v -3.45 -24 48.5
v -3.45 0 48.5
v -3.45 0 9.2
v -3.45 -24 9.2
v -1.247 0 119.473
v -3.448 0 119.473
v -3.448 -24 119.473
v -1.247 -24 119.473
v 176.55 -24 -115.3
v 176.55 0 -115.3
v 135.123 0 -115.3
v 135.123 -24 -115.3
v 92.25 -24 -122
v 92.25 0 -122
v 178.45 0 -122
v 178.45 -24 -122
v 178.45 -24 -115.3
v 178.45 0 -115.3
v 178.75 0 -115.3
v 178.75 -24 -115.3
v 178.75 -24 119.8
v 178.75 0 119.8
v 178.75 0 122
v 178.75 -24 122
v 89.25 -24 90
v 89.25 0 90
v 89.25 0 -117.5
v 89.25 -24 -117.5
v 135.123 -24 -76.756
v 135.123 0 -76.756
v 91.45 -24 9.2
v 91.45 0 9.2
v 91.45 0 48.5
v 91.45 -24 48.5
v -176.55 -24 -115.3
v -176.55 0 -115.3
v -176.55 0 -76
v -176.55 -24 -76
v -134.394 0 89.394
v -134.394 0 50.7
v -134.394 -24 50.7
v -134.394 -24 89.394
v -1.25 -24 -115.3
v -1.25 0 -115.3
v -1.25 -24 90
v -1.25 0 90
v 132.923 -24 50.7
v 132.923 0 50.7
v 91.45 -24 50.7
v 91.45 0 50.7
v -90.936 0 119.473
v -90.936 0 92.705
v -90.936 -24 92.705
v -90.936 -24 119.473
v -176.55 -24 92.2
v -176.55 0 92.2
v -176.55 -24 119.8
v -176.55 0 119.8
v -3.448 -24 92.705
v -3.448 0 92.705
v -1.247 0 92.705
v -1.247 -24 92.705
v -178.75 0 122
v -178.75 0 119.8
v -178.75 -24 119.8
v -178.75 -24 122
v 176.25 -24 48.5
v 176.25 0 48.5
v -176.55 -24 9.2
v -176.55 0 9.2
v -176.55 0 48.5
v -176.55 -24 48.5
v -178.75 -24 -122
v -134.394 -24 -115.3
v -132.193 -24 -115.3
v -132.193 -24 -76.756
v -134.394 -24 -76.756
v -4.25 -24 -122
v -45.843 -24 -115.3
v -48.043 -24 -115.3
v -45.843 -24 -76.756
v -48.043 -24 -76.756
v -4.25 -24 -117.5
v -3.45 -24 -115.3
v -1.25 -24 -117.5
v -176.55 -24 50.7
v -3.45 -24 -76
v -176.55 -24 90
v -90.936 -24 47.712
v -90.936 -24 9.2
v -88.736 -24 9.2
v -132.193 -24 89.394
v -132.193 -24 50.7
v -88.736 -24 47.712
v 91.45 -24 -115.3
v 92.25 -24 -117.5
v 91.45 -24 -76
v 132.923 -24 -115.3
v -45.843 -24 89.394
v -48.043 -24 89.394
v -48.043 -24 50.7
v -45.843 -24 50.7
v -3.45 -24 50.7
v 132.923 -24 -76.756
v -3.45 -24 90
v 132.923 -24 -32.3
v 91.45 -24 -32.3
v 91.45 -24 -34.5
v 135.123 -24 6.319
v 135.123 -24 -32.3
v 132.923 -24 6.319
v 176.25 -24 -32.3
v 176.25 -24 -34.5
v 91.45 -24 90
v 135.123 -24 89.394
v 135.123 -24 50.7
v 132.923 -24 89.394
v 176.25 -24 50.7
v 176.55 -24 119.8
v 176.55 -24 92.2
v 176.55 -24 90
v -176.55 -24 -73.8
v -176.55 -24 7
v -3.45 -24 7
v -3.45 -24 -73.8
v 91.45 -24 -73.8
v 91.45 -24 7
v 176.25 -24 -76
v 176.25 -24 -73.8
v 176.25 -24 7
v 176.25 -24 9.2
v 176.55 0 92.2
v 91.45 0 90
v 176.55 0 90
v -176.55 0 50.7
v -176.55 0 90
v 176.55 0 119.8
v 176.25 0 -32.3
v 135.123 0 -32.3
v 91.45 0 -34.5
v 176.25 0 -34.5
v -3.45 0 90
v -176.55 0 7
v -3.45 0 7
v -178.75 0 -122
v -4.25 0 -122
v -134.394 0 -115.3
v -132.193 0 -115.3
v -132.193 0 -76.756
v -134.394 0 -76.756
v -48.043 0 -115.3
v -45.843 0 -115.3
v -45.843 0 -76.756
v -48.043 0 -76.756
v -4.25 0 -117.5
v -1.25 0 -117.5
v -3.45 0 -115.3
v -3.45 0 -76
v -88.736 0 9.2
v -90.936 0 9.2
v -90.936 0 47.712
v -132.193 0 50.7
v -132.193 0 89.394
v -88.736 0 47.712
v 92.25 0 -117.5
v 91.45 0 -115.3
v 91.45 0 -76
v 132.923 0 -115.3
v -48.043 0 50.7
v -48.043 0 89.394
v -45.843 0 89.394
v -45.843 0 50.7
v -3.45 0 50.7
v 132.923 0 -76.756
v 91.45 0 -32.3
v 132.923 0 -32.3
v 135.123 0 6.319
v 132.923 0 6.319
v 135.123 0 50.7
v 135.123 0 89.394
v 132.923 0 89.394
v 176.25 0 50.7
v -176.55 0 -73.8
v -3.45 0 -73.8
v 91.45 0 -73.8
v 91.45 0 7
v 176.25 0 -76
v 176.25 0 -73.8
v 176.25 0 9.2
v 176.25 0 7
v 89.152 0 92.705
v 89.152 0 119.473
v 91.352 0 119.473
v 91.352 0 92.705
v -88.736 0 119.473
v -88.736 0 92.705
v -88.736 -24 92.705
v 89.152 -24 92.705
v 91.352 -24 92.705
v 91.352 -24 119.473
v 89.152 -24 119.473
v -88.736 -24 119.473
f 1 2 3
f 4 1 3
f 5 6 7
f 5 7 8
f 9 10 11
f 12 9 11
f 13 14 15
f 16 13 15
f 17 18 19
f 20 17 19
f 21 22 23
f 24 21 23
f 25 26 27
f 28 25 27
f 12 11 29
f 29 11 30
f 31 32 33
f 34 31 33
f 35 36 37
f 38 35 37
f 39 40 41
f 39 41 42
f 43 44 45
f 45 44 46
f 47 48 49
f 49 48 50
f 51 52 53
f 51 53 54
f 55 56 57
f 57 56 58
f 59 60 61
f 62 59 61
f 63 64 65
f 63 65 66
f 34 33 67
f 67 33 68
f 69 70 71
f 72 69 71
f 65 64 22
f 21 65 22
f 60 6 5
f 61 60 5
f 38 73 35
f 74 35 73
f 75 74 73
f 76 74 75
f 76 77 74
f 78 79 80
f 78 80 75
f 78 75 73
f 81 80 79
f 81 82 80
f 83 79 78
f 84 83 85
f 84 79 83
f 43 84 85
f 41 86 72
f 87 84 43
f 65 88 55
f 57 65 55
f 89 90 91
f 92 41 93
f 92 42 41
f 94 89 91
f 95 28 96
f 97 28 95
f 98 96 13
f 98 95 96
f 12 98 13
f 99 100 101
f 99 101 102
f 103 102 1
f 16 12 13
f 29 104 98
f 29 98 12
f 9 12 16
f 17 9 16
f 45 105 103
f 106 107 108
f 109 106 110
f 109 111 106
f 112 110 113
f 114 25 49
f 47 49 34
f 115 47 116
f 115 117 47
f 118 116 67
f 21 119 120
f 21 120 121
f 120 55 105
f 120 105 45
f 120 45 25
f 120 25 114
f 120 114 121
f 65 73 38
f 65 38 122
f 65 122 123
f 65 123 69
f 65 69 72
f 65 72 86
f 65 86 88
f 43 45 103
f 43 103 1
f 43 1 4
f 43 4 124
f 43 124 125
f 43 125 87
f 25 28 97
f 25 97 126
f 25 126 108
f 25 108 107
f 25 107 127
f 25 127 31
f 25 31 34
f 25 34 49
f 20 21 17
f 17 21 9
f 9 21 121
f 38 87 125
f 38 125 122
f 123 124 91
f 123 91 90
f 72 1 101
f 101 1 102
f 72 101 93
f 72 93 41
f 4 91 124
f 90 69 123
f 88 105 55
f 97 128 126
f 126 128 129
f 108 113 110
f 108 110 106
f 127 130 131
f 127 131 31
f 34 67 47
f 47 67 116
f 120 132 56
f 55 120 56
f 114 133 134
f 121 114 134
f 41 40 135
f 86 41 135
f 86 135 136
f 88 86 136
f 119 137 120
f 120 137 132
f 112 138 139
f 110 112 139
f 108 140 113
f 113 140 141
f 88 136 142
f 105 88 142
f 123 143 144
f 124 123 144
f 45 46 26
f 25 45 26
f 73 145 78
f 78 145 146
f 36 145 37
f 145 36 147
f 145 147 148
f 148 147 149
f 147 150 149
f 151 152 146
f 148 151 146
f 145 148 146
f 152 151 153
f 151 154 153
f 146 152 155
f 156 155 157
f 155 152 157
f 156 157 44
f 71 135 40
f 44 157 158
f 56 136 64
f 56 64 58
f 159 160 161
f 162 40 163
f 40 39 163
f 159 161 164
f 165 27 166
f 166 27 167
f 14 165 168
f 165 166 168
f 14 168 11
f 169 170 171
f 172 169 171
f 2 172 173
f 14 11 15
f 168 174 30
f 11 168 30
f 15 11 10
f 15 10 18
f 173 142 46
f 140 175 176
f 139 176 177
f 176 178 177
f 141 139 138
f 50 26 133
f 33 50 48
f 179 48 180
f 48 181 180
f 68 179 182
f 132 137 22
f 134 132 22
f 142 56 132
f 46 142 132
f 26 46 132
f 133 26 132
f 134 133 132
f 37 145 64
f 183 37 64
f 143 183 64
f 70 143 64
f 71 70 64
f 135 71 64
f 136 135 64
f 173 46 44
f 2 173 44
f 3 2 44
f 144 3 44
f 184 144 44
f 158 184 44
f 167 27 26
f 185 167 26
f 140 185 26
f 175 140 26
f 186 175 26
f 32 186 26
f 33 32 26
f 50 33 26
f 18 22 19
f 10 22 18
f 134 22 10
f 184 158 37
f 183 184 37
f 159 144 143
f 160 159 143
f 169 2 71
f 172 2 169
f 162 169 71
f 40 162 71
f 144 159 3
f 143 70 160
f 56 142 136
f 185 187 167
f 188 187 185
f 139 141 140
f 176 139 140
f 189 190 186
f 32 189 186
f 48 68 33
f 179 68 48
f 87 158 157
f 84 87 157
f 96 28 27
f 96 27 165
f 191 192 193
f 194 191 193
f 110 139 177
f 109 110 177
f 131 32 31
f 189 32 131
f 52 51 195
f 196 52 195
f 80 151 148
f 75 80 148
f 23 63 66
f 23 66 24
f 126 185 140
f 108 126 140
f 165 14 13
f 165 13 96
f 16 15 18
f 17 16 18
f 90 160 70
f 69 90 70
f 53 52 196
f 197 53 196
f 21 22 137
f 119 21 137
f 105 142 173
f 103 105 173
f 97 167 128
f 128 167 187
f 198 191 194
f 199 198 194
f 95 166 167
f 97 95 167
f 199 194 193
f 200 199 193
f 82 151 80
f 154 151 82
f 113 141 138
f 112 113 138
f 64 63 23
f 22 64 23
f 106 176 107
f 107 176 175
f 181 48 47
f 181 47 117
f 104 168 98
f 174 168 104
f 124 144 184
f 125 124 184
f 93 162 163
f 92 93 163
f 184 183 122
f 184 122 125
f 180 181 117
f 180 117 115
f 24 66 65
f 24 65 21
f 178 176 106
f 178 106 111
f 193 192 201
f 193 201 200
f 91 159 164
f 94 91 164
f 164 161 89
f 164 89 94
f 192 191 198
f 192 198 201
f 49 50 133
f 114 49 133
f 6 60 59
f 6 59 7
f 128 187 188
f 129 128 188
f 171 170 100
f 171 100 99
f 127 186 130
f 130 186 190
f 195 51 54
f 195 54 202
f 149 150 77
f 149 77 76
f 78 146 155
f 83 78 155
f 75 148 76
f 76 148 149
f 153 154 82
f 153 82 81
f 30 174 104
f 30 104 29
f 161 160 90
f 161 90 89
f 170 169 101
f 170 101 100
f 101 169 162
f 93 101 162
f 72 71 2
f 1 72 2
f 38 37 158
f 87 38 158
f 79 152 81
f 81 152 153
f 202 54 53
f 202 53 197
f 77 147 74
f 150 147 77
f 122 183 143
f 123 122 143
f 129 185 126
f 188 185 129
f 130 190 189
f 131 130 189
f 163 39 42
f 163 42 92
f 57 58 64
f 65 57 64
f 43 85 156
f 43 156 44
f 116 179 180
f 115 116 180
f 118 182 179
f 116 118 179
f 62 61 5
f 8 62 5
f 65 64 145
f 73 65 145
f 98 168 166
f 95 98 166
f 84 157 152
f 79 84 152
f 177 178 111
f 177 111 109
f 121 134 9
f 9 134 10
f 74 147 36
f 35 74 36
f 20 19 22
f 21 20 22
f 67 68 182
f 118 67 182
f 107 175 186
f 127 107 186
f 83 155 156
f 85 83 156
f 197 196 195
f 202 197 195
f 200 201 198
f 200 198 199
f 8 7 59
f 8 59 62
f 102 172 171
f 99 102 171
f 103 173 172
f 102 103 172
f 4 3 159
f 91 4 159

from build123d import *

# Parameters (mm, degrees)
F0_W     = 357.49997
F0_H     = 2.200038
F1_DEPTH = 24
F0_W_2   = 0.000344
F0_W_3   = 2.200038
F0_H_2   = 0.156408
F0_H_3   = 38.543728
F0_H_4   = 38.69359
F0_H_5   = 0.006374
F0_W_4   = 86.200079
F0_H_6   = 0.000344
F0_W_5   = 84.799647
F0_H_7   = 4.499984
F0_W_6   = 174.499943
F0_W_7   = 173.100028
F0_H_8   = 38.618832
F0_H_9   = 0.081304
F0_H_10  = 38.512034
F0_H_11  = 0.18793
F0_H_12  = 26.76822


with BuildPart() as f1:
    # F0 (on Front) → F1 (new body)
    with BuildSketch(Plane.XZ):
        with Locations((0, 120.900114)):
            Rectangle(F0_W, F0_H)
    extrude(amount=F1_DEPTH)


with BuildPart() as f1b:
    # F0 (on Front) → F1, piece 2 (new body)
    with BuildSketch(Plane.XZ):
        Polygon((91.450232, 89.999847), (176.549947, 89.999847), (176.549947, 92.199885), (-176.549947, 92.199885), (-176.549947, 89.999847), (-3.449919, 89.999847), (-1.249881, 89.999847), (89.250194, 89.999847), align=None)
        Polygon((176.549947, 92.199885), (176.549947, 89.999847), (176.549947, -115.300111), (178.450262, -115.300111), (178.749985, -115.300111), (178.749985, 119.79975), (176.549947, 119.79975), align=None)
        Polygon((91.450232, 50.69992), (91.450232, 89.999847), (89.250194, 89.999847), (89.250194, -115.300111), (91.450232, -115.300111), (91.450232, -76.000185), (91.449888, -76.000185), (91.449888, -73.800147), (91.450232, -73.800147), (91.450232, -34.50022), (91.449888, -34.50022), (91.449888, -32.300182), (91.450232, -32.300182), (91.450232, 6.999917), (91.449888, 6.999917), (91.449888, 9.199955), (91.450232, 9.199955), (91.450232, 48.499882), (91.449888, 48.499882), (91.449888, 50.69992), align=None)
        Polygon((178.450262, -115.300111), (176.549947, -115.300111), (135.122674, -115.300111), (135.122674, -115.456519), (132.922636, -115.456519), (132.922636, -115.300111), (91.450232, -115.300111), (89.250194, -115.300111), (89.250194, -117.500149), (92.250183, -117.500149), (92.250183, -117.499805), (178.450262, -117.499805), align=None)
        with Locations((91.45006, 49.599901)):
            Rectangle(F0_W_2, F0_H)
        Polygon((132.922636, 50.69992), (91.450232, 50.69992), (91.450232, 48.499882), (176.249879, 48.499882), (176.249879, 50.69992), (135.122674, 50.69992), (135.122674, 50.693546), (132.922636, 50.693546), align=None)
        Polygon((-176.549947, 89.999847), (-176.549947, 92.199885), (-176.549947, 119.79975), (-178.749985, 119.79975), (-178.749985, -115.300111), (-176.549947, -115.300111), (-176.549947, -76.000185), (-176.549947, -73.800147), (-176.549947, 6.999917), (-176.549947, 9.199955), (-176.549947, 48.499882), (-176.549947, 50.69992), align=None)
        with Locations((134.022655, -115.378315)):
            Rectangle(F0_W_3, F0_H_2)
        with Locations((134.022655, -96.028247)):
            Rectangle(F0_W_3, F0_H_3)
        Polygon((-1.249881, -115.300111), (-1.249881, 89.999847), (-3.449919, 89.999847), (-3.449919, 50.69992), (-3.449919, 48.499882), (-3.449919, 9.199955), (-3.449919, 6.999917), (-3.449919, -73.800147), (-3.449919, -76.000185), (-3.449919, -115.300111), (-1.250053, -115.300111), align=None)
        with Locations((134.022655, 70.046715)):
            Rectangle(F0_W_3, F0_H_4)
        with Locations((134.022655, 50.696733)):
            Rectangle(F0_W_3, F0_H_5)
        with Locations((135.3502225, -117.499977)):
            Rectangle(F0_W_4, F0_H_6)
        with Locations((91.45006, 8.099936)):
            Rectangle(F0_W_2, F0_H)
        with Locations((133.8500555, 8.099936)):
            Rectangle(F0_W_5, F0_H)
        Polygon((-134.393519, 50.69992), (-176.549947, 50.69992), (-176.549947, 48.499882), (-3.449919, 48.499882), (-3.449919, 50.69992), (-45.843369, 50.69992), (-45.843369, 50.693546), (-48.043407, 50.693546), (-48.043407, 50.69992), (-132.193481, 50.69992), (-132.193481, 50.693546), (-134.393519, 50.693546), align=None)
        with Locations((135.3502225, -119.750141)):
            Rectangle(F0_W_4, F0_H_7)
        Polygon((-1.250053, -117.500149), (-1.250053, -115.300111), (-3.449919, -115.300111), (-45.843369, -115.300111), (-45.843369, -115.456519), (-48.043407, -115.456519), (-48.043407, -115.300111), (-132.193481, -115.300111), (-132.193481, -115.456519), (-134.393519, -115.456519), (-134.393519, -115.300111), (-176.549947, -115.300111), (-178.749985, -115.300111), (-178.749985, -117.499805), (-4.250042, -117.499805), (-4.250042, -117.500149), align=None)
        with Locations((133.8500555, -74.900166)):
            Rectangle(F0_W_5, F0_H)
        with Locations((91.45006, -74.900166)):
            Rectangle(F0_W_2, F0_H)
        with Locations((-133.2935, 70.046715)):
            Rectangle(F0_W_3, F0_H_4)
        with Locations((-133.2935, 50.696733)):
            Rectangle(F0_W_3, F0_H_5)
        with Locations((-46.943388, 50.696733)):
            Rectangle(F0_W_3, F0_H_5)
        with Locations((-46.943388, 70.046715)):
            Rectangle(F0_W_3, F0_H_4)
        with Locations((91.45006, -33.400201)):
            Rectangle(F0_W_2, F0_H)
        Polygon((132.922636, -32.300182), (91.450232, -32.300182), (91.450232, -34.50022), (176.249879, -34.50022), (176.249879, -32.300182), (135.122674, -32.300182), (135.122674, -32.381486), (132.922636, -32.381486), align=None)
        Polygon((-90.936396, 9.199955), (-176.549947, 9.199955), (-176.549947, 6.999917), (-3.449919, 6.999917), (-3.449919, 9.199955), (-88.736358, 9.199955), (-88.736358, 9.012025), (-90.936396, 9.012025), align=None)
        with Locations((-91.5000135, -117.499977)):
            Rectangle(F0_W_6, F0_H_6)
        with Locations((-46.943388, -115.378315)):
            Rectangle(F0_W_3, F0_H_2)
        with Locations((-46.943388, -96.028247)):
            Rectangle(F0_W_3, F0_H_3)
        with Locations((-89.999933, -74.900166)):
            Rectangle(F0_W_7, F0_H)
        with Locations((-91.5000135, -119.750141)):
            Rectangle(F0_W_6, F0_H_7)
        with Locations((134.022655, -12.990766)):
            Rectangle(F0_W_3, F0_H_8)
        with Locations((134.022655, -32.340834)):
            Rectangle(F0_W_3, F0_H_9)
        with Locations((-89.836377, 28.455972)):
            Rectangle(F0_W_3, F0_H_10)
        with Locations((-89.836377, 9.10599)):
            Rectangle(F0_W_3, F0_H_11)
        with Locations((-133.2935, -96.028247)):
            Rectangle(F0_W_3, F0_H_3)
        with Locations((-133.2935, -115.378315)):
            Rectangle(F0_W_3, F0_H_2)
    extrude(amount=F1_DEPTH)


with BuildPart() as f1c:
    # F0 (on Front) → F1, piece 3 (new body)
    with BuildSketch(Plane.XZ):
        with Locations((-89.836377, 106.088701)):
            Rectangle(F0_W_3, F0_H_12)
    extrude(amount=F1_DEPTH)


with BuildPart() as f1d:
    # F0 (on Front) → F1, piece 4 (new body)
    with BuildSketch(Plane.XZ):
        with Locations((-2.347488, 106.088701)):
            Rectangle(F0_W_3, F0_H_12)
    extrude(amount=F1_DEPTH)


with BuildPart() as f1e:
    # F0 (on Front) → F1, piece 5 (new body)
    with BuildSketch(Plane.XZ):
        with Locations((90.251683, 106.088701)):
            Rectangle(F0_W_3, F0_H_12)
    extrude(amount=F1_DEPTH)


solid = Compound([f1.part, f1b.part, f1c.part, f1d.part, f1e.part])
